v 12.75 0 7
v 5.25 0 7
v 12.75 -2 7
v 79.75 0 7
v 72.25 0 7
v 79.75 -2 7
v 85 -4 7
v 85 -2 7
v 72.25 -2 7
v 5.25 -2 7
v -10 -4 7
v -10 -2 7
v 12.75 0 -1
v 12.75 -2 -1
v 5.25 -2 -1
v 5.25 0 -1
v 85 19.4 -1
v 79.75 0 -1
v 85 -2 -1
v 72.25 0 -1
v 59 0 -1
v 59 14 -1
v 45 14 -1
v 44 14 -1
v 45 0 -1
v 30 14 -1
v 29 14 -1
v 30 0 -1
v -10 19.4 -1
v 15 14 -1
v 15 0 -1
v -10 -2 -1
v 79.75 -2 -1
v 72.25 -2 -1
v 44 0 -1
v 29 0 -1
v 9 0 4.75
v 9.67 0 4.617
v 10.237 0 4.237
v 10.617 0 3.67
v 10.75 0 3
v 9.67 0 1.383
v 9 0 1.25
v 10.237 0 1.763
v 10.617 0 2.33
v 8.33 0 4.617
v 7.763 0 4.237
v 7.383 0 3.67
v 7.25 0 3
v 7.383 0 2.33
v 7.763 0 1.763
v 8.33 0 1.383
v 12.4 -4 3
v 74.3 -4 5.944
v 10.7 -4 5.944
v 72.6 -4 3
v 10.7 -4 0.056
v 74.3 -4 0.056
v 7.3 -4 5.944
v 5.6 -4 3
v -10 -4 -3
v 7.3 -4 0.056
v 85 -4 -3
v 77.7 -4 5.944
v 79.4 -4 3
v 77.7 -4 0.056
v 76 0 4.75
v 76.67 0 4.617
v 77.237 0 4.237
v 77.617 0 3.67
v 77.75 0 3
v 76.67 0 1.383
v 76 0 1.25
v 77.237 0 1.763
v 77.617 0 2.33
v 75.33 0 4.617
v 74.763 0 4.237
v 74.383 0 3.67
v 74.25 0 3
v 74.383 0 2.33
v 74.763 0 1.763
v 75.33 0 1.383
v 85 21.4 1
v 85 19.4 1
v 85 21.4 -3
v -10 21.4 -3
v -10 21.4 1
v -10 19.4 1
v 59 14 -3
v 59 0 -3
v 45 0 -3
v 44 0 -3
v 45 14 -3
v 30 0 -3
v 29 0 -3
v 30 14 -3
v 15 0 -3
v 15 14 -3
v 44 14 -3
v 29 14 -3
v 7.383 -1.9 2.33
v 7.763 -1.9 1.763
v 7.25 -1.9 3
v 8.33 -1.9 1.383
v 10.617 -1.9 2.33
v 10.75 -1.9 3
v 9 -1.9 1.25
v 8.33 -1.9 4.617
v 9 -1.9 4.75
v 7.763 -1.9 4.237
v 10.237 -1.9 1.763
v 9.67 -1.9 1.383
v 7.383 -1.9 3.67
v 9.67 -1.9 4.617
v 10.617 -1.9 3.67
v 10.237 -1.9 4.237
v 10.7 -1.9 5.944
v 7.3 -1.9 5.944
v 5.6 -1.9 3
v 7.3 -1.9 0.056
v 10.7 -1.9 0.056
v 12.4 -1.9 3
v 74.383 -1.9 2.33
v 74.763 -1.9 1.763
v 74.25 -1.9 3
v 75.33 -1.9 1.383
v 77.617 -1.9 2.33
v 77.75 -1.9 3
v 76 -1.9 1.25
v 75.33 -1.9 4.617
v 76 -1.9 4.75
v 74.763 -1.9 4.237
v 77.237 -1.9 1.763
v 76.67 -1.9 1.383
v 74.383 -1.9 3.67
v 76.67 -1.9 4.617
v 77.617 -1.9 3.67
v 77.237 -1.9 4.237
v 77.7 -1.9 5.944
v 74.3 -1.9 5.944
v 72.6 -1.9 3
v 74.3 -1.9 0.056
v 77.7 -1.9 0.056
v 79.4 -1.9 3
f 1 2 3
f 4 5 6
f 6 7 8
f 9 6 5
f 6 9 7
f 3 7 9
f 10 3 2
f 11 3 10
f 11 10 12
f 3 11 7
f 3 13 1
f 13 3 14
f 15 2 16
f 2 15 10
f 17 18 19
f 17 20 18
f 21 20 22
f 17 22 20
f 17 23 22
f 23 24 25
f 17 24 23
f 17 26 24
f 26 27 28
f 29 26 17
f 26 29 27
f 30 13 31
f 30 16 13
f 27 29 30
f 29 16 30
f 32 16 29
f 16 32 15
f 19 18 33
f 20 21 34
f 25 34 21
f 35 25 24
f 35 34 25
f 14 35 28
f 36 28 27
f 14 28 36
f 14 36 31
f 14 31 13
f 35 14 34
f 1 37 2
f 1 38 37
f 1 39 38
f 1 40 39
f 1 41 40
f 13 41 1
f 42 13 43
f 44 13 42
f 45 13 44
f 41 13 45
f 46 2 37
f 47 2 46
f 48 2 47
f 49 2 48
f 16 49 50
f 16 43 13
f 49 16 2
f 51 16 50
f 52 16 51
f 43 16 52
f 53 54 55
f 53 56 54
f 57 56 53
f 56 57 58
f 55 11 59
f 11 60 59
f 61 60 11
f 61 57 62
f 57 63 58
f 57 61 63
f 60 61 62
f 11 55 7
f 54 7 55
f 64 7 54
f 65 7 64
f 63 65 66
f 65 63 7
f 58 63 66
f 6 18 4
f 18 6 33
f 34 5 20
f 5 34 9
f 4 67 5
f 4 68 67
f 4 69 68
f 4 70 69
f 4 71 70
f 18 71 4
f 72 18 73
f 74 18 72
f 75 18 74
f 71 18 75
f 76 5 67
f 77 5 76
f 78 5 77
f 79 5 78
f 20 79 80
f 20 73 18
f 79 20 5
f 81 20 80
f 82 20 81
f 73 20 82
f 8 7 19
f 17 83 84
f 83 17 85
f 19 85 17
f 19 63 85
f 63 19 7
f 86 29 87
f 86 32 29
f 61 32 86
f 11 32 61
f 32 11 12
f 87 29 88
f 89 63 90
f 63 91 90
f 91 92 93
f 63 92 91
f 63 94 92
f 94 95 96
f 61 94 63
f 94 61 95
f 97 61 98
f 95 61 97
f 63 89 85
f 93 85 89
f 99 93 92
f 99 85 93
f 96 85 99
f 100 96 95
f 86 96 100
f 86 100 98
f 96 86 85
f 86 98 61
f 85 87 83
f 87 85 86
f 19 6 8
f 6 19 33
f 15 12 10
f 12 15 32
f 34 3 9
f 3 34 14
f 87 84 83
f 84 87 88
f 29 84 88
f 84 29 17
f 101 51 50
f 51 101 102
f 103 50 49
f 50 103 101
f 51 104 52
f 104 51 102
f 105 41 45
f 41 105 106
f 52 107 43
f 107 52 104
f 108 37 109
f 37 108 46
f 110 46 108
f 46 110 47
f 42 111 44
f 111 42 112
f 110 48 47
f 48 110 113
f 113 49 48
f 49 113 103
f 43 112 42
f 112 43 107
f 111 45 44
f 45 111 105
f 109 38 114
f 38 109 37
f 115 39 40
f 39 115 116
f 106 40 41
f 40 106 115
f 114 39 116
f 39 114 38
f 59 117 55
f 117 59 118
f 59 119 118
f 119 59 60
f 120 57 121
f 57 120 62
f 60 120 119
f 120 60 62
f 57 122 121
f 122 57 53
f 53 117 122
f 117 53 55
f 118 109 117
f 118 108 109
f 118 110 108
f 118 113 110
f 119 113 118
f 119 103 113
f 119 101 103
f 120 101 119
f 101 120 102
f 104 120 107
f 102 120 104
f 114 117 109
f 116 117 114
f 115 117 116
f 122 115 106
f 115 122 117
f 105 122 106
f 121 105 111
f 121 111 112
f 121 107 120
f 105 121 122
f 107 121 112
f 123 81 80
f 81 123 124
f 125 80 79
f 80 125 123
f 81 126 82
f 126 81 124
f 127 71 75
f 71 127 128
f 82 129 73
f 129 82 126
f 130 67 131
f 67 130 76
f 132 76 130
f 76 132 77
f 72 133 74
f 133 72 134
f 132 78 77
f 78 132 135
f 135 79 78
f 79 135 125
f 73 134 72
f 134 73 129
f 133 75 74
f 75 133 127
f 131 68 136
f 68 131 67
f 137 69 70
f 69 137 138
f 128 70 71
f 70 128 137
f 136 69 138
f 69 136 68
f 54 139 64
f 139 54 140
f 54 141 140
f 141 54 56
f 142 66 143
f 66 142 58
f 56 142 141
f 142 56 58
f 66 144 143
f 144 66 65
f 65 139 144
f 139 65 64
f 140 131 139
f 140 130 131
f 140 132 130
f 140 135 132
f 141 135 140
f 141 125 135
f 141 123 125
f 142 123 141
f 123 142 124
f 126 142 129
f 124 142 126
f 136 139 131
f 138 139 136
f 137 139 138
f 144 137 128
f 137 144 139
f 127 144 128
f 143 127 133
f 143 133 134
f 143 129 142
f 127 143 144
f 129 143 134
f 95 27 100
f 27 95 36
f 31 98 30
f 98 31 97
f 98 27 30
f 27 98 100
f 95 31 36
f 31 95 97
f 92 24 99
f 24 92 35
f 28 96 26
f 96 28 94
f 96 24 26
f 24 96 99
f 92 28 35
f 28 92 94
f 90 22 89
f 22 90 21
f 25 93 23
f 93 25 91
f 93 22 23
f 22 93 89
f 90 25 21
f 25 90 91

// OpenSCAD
// file: ../library/din41612/connector_dim.scad
// connector
// Connector to be mounted on pcb of the modules

pcb_thick=1.6;

con_w=87.5;   // width of connector bodywithout flanges of mounting holes 
con_d=2.8;    // diameter of mounting holes
con_d_w=88.9; // distance between mounting holes
con_m_h=6;    // height of mounting cube
con_h=13;     // largest z dimension

pcb_d_h=10.2;  // ???

// connector dimensions
motherboard_con_head_w=85;  // width of the connector head
motherboard_con_head_d=8.5; // depth of the connector head
motherboard_con_w=95;       // largest width of the connector
motherboard_con_h=11.6;     // largest height of the connector
motherboard_con_t=11;       // largest depth of the connector
motherboard_con_d_w=90;     // distance between mounting holes
motherboard_con_d=2.8;      // diameter of mounting holes
motherboard_con_out=5.2;    // height produced by the connector when pulgged in 

// pcb module connector dimension
pcbmodule_con_out=13-(5.3+2.8-2.54);  // distance connector sticks out of pcb

// for codings
//code=2157;
//code_n=14;
//code_l=motherboard_con_head_w/code_n/2;
//
//label_width=24;
//label_thick=0.5;
//label_size=6;
//label_text_thick=1;
//label_height=label_size+2;
//pass=0.5;
// file: bracket.scad
// bracket
// A bracket of the elecbox module
// - type: 0 front bracket, 1 rear bracket
// - width 1..n in steps
// - var: 0 do not create intermediate mounting holes, 1 create intermediate mounting holes 

include <pcbmodule_dim.scad>
include <../motherboard/motherboard_dim.scad>
include <../library/linurs/linurs_screw_dim.scad>

use <../library/linurs/linurs_screw.scad>


module bracket(type=0, width=1, var=0){
  echo("bracket");  
  color("White")
  translate([type*motherboard_w,
             0,
             0])  // move mirrored bracket in position if desired
  mirror([type*1,0,0])       // mirror it if desired
  difference(){
    union(){
      for(x=[1:width]){  // create the mounting hole cubes 
        for(z=[pcb_y1,pcb_y2]){
          translate([pcb_x1,
                     (x-1)*step*var-bracket_hole_cube_h/2,
                     z])
          cube([bracket_x1-bracket_t,bracket_hole_cube_h,3*screw_d[bracket_screw]],center=true);
        }
      }

      translate([bracket_t/2+bracket_offset_x,
                 step/2*width-bracket_hole_cube_h,
                 bracket_h/2+bracket_offset_z])  
      cube([bracket_t,step*width,bracket_h],center=true);  // create the bracket front


      translate([bracket_x1/2+bracket_offset_x,
                 bracket_t/2-bracket_hole_cube_h,
                 bracket_h/2+bracket_offset_z]) 
      cube([bracket_x1,bracket_t,bracket_h],center=true);  // create the bracket mounting


      translate([bracket_x2/2+bracket_offset_x,
                 bracket_t/2-bracket_hole_cube_h+step*width-bracket_t,
                 bracket_h/2+bracket_offset_z]) 
      cube([bracket_x2,bracket_t,bracket_h],center=true);  // create the bracket mounting


    }
    for(x=[1:width]){ // create the mounting hole 
      for(z=[pcb_y1,pcb_y2]){
        translate([pcb_x1,
                   (x-1)*step*var-olp,
                   z])
        rotate([0,90,0])
        rotate([-90,0,0])
        screw_fix(w=2*bracket_hole_cube_h,d=bracket_screw,type=head_no, t=screw_t);
      }
    }
  }
}

// to show
//bracket(type=1, width=2, var=1);
//
bracket();
//
bracket(type=1);
// file: ../library/linurs/linurs_screw.scad
// Metric screws and nuts 
// urs@linurs.org 2019
// It is targeted for 3D printing applications. 
// To look realistic is not the goal (Example: Nuts do not have a hole)

include <linurs_screw_dim.scad>

// Changes
//2019-02-09 split in two files
//2017-05-19 bug fix hexbolt had wrong diameter
//2017-01-22 bug fix lentgh of hex scre is outer lenght as other screw types
//2017-01-06 added hex screw
//2015-10-12 added screw_cut
//2015-11-29 screw_fix parameter sunk added, and module hex_bolt

// Consistent parameters in this file
// d screw diameter M2_5, M3, ... (enumeration with screw_d)
// t millimeters added to diameters 
//   For the screw, head, nut = 0. 
//   For the piece where the screw, nut, ... passes through = 0.5 so it slides in well

// functions used multiple times to position nuts and heads
function headh_cyl(d)=screw_cyl[d][1];  // height of cyl screw head
function headh_cnt(d)=screw_cyl[d][1];  // height of cnt screw head
function headh(d,type=head_cyl)=(type==head_cyl ? headh_cyl(d) : (type==head_cnt ? headh_cnt(d) : 0 )); // height of screw head 

function nuth(d)=screw_hex[d][2];   // height of hex nut

// head of a cylinder screw
module screw_head_cyl(d=M3, t=0)
{
  screwhd=screw_cyl[d][0]+t; // diameter of cylinder screw head
  cylinder(d=screwhd,h=headh(d=d, type=head_cyl), center=true,$fn=16); // screw head
}

// head of a countersunk screw
module screw_head_cnt(d=M3, t=0)
{
  screwd=screw_d[d]+t; 
  screwhd=screw_cnt[d][0]+t; // diameter of cylinder screw head
  cylinder(d1=screwd,d2=screwhd,h=headh(d=d,type=head_cnt), center=true,$fn=16); // screw head
}

// head of a hex screw
module screw_head_hex(d=M3, t=0)
{
    translate([0,0,-nuth(d)/2])nut(d=d, t=t);
}

// head of all screws
module screw_head(d=M3, type=head_cyl, t=0)
{ 
  if(type==head_cnt){
    screw_head_cnt(d=d, t=t);
  } else {
    if(type==head_cyl){
      screw_head_cyl(d=d, t=t);
    } else {
       if(type==head_hex){
           screw_head_hex(d=d, t=t); 
       } 
    }    
  }
}

// hex bolt 
module hex_bolt(d=M3, h=10, t=0)
{
  nutd=screw_hex[d][1]+t; // outer diameter of hex bolt
  cylinder(r=nutd/2,h=h+t, center=true,$fn=6); // nut
}

// nut 
module nut(d=M3, t=0)
{
  hex_bolt(d=d, h=nuth(d), t=t);    
}

// screw 
// w outer width of the screw = screw length + head 
module screw(w=10, d=M3, type=head_cyl, t=0){
  screwd=screw_d[d]+t;       // screw diameter
  cylinder(d=screwd, h=w, center=true,$fn=16); // screw thread length
  translate([0,0,w/2-headh(d=d,type=type)/2])
  screw_head(d=d,type=type, t=t);
}

// screw fix
// w outer width of the screw = screw length + head 
// sink additional material below to remove 
// raise additional material above to remove
module screw_fix(w=10, d=M3, type=head_cyl, sink=0, raise=0, t=0){
  screw(w=w-sink*2, d=d, type=type, t=t);
  translate([0,0,-(w-sink*2)/2+nuth(d)/2])
    nut(d=d,t=t);
  //additional material to be removed above the nut  
  translate([0,0,-(w-sink+raise)/2])hex_bolt(d=d,h=sink+raise+0.01,t=t);    
  //additional material to be removed above the screw head
  if(type==head_cnt){  
    translate([0,0,(w-sink+raise)/2])
    cylinder(d=screw_cnt[d][0]+t,h=sink+raise+0.01,center=true,$fn=16);
  }else{ 
    translate([0,0,(w-sink+raise)/2])
    cylinder(d=screw_cyl[d][0]+t,h=sink+raise+0.01,center=true,$fn=16);
  }     
}
//screw_fix();
//translate([10,0,0])screw_fix(sink=2,type=head_cnt);
//

// screw cut
// material to be extracted from object to slide in a counter sunk screw for fixation
// w height of the cut out
// i depth of the screw
module screw_cut(d=M3,w=20,i=10,t=0,fn=32){
    hsh=screw_cnt[d][1];
    ws=screw_cnt[d][0]+t;
    ds=screw_d[d]+t;
    
    translate([i/2,0,-(w-hsh)/2])
      cube([i,ws,hsh],center=true);
    
    translate([0,0,-(w-hsh)/2])
      cylinder(d=ws,h=hsh,center=true,$fn=32);
    
    translate([0,0,-(w-hsh)/2+hsh])
        cylinder(d2=ds, d1=ws, h=hsh,center=true,$fn=fn);
    
    cylinder(h=w, d=ds, center=true, $fn=fn);   
    
    translate([i/2,0,0]) 
        cube([i,ds,w],center=true);
    
    for(y=[-1,1]){
        translate([i/2,y*ds/2,-w/2+hsh])
            rotate([45,0,0])
            cube([i,sqrt(2)*(ws-ds)/2,sqrt(2)*(ws-ds)/2],center=true);
    }
}
//screw_cut();

// nut cut
// material to be extracted from object to slide in a nut for fixation
// w height of the cylinder
// i lenght of the inlet
module nut_cut(w=10, wi=0, d=M3, i=10, t=0, raise=0, type=head_cyl){ 
  nut(d,t);
  translate([i/2,0,0])
    cube([i,screw_hex[d][0]+t,nuth(d)+t],center=true);
  translate([0,0,-wi])
      if(type==head_cnt){    
          screw(w=w, d=d, type=type, t=t); 
        translate([0,0,(w+raise)/2-0.01])
          cylinder(d=screw_cnt[d][0]+t,h=raise,center=true,$fn=16);
      }else{ 
          screw(w=w, d=d, type=type, t=t);   
        translate([0,0,(w+raise)/2-0.01])
          cylinder(d=screw_cyl[d][0]+t,h=raise,center=true,$fn=16);
      }       
}
//nut_cut(raise=2,type=head_cnt,i=14,w=20,wi=2, t=1);

// nut cut
// material to be extracted from object to slide in a nut for fixation
// w height of the cylinder
// i lenght of the inlet
module nut_cut_r(w=10, wi=0, d=M3, i=10, t=0, raise=0, type=head_cyl){ 
  rotate([0,0,90])nut(d,t);
  translate([i/2,0,0])
    cube([i,screw_hex[d][1]+t,nuth(d)+t],center=true);
  translate([0,0,-wi])
      if(type==head_cnt){    
          screw(w=w, d=d, type=type, t=t); 
        translate([0,0,(w+raise)/2-0.01])
          cylinder(d=screw_cnt[d][0]+t,h=raise,center=true,$fn=16);
      }else{ 
          screw(w=w, d=d, type=type, t=t);   
        translate([0,0,(w+raise)/2-0.01])
          cylinder(d=screw_cyl[d][0]+t,h=raise,center=true,$fn=16);
      }       
}
//nut_cut(raise=2,type=head_cnt,i=14,


// present the library
show=1;

if(show==1){
    grid=20;
    
    for (j=[0:10]){
        for (i=[0:3])
           translate([j*grid,i*grid,0]){  
           
    // elements           
           if(j==0){
             screw_fix(w=(i+2)*5,d=i, type=head_cyl, t=0);
           }
       
           if(j==1){
             nut(d=i,t=0);
           } 
       
           if(j==2){   
              screw(d=i,t=0);
           } 
           
           if(j==3){   
              screw(d=i,t=0,type=head_cnt);
           } 
           
           if(j==4){   
              screw(d=i,t=0,type=head_hex);
           } 
           
           if(j==5){   
              hex_bolt(d=i,t=0);
           } 
           
       }
    }   
     
    for (j=[0:2]){
        for (i=[0:3])
           translate([j*grid,-(i+1)*grid,0]){  
             difference(){
                cube([3*screw_d[i],3*screw_d[i],(i+2)*5-0.1],center=true);    
    
                if(j==0){
                  screw_fix(w=(i+2)*5,d=i,type=head_cnt, t=0.5);
                }   
                
                if(j==1){
                  nut_cut(d=i,w=(i+2)*5);
                }
                if(j==2){
                  screw_cut(d=1,w=(i+2)*5);
                }
            
             }
           }  
        
    }
}
   
// file: ../library/linurs/linurs_screw_dim.scad
// Metric screws and nuts 
// urs@linurs.org 2015

// contains dimensions of linurs_screw and can be included in other 
// OpenScad files 


// Consistent parameters in this file
// d screw diameter M2_5, M3, ... (enumeration with screw_d)
// t millimeters added to diameters 
//   For the screw, head, nut = 0. 
//   For the piece where the screw, nut, ... passes through = 0.5 so it slides in well

// enumerations of metric threads
M2_5=0;
M3=1;
M4=2;
M5=3;

// enumerations screw head type
head_cyl=0; // cylinder
head_cnt=1; // countrsunk
head_no=2;  // no head at all
head_hex=3;  // no head at all

// screw diameters
screw_d=[
2.5, // M2.5
3.0, // M3
4.0, // M4
5.0  // M5
];

// sizes for hex nuts
screw_hex=[
//   s,   e,   h
 [ 5.0, 5.8, 1.7], // M2.5
 [ 5.5, 6.4, 2.0], // M3
 [ 7.0, 8.1, 2.8], // M4
 [ 8.0, 9.2, 3.5]  // M5
];

// sizes for cylinder screw heads
screw_cyl=[
//   d,   h
 [ 4.5, 1.6], // M2.5
 [ 5.5, 2.0], // M3
 [ 7.0, 2.6], // M4
 [ 8.5, 3.3]  // M5
];

// sizes for countersunk screw heads
screw_cnt=[
//   d,   h
 [ 4.7, 1.50], // M2.5
 [ 5.6, 1.65], // M3
 [ 7.4, 2.20], // M4
 [ 9.2, 2.50]  // M5
];
// file: ../motherboard/motherboard_dim.scad
include<../library/din41612/connector_dim.scad>
// motherboard pcb dimensions
motherboard_w=100;   // pcb width
motherboard_t=1.6;   // pcb thickness
motherboard_pass=0.5;// gap to fit screws 
step=25.4;           // distance between modules



// offset
motherboard_z_offset= -(pcbmodule_con_out+motherboard_con_out+motherboard_t); // z offset motherboard built in
// file: pcbmodule_dim.scad
include <../library/linurs/linurs_screw_dim.scad>
include <../motherboard/motherboard_dim.scad>
// pcb constants
pcb_h=80;              // height of the pcb
pcb_thick=1.6;         // thickness
pcb_x1=3;              // position mounting holes
pcb_x2=97;
pcb_y1=9;
pcb_y2=76;
pcb_d=3;               // diameter of holes

// bracket constants
bracket_t=2;           // thickness of bracket
bracket_x1=10;         // depth of the U shape at the side of the screw
bracket_x2=4;          // depth of the U shape at the side where no screw is  
bracket_h=pcb_h+15;    // height of bracket
bracket_hole_cube_h=4; // height of the mounting hole cube
bracket_screw=M2_5;    // hole for the screw

// bracket offsets
bracket_offset_x=-3;   // bracket offset in elecbox x axis (adding gap)
bracket_offset_z=-10;  // bracket offset in elecbox z axis

// pcb module dimensions
pcbmodule_w=(-bracket_offset_x)*2+motherboard_w; // depth of the module
pcbmodule_h=bracket_h;                           // hight of the module   
pcbmodule_l=step;                                // width of the module   

screw_t=1; //mm added so screws fit into holes
olp=0.1; // overlapp distance to produce nice body after difference() 
// main file
// bracket
// A bracket of the elecbox module
// - type: 0 front bracket, 1 rear bracket
// - width 1..n in steps
// - var: 0 do not create intermediate mounting holes, 1 create intermediate mounting holes 

include <pcbmodule_dim.scad>
include <../motherboard/motherboard_dim.scad>
include <../library/linurs/linurs_screw_dim.scad>

use <../library/linurs/linurs_screw.scad>
use <bracket.scad>

module arduino(){
    difference(){
        bracket(type=0);
        translate([0,1+12/2,52.5+13/2])cube([20,12,13],center=true);
        translate([0,1+12/2,24+10/2])cube([20,12,10],center=true);
        translate([0,1+12+2/2,21.5+54/2])cube([20,2,54],center=true);
    }
}
//rotate([0,-90,0])
//arduino();

module 3DprinterIOfront(){
    difference(){
        bracket(type=0);
        translate([0,11/2,37.5+34/2])cube([20,11,34],center=true);        
    }
}
//rotate([0,-90,0])
//3DprinterIOfront();

module 3DprinterIOback(){
    difference(){
        translate([-100,0,0])bracket(type=1);
        translate([0,14/2,12+31/2])cube([20,14,31],center=true); 
        translate([0,14/2,53.5+18.5/2])cube([20,14,18.5],center=true);               
    }
}
//rotate([0,90,0])
//3DprinterIOback();

module Fetback(){
    difference(){
        translate([-100,0,0])bracket(type=1);
        translate([0,14/2,15+51/2])cube([20,14,51],center=true); 
       
    }
}
//rotate([0,90,0])
//Fetback();

module Stepperback(){
    difference(){
        translate([-100,0,0])bracket(type=1);
        translate([0,14/2,15+14/2])cube([20,14,14],center=true); 
        translate([0,14/2,30+14/2])cube([20,14,14],center=true); 
        translate([0,14/2,45+14/2])cube([20,14,14],center=true); 
     //   translate([0,14/2,60+14/2])cube([20,14,8],center=true); 
            
    }
}
//
rotate([0,90,0])
//
Stepperback();

module Stepperfront(){
    difference(){
        bracket(type=0);
        translate([0,14/2,15+14/2])cube([20,14,14],center=true); 
        translate([0,14/2,30+14/2])cube([20,14,14],center=true);    
       translate([0,14/2,60+14/2])cube([20,14,8],center=true);      
    }
}
//rotate([0,-90,0])
//Stepperfront();

module I2Cback(){
    difference(){
        translate([-100,0,0])bracket(type=1);
        translate([0,12/2,31+13/2])cube([20,12,13],center=true);       
    }
}
//rotate([0,90,0])
//I2Cback();

module I2Cfront(){
    difference(){
        bracket(type=0);
        translate([0,13/2,21+25/2])cube([20,13,25],center=true); 
        translate([0,5,49])rotate([0,90,0])cylinder(h=20,d=5.5,center=true, $fn=16);    
        translate([0,5,57])rotate([0,90,0])cylinder(h=20,d=5.5,center=true, $fn=16);      
    }
}
//rotate([0,-90,0])
//I2Cfront();

module MCP2221back(){
    h=12;
    w=13;
    z=31;
    difference(){
        translate([-100,0,0])bracket(type=1);
        translate([0,h/2+pcb_thick,z+w/2])cube([20,h,w],center=true);       
    }
}
//rotate([0,90,0])
//MCP2221back();

module MCP2221front(){
    h1=12;
    w1=12;
    z1=29;
    d2=4;
    h2=3;
    z2=66;
    difference(){
        bracket(type=0);
        translate([0,h1/2+pcb_thick,z1+w1/2])cube([20,h1,w1],center=true); 
        translate([0,h2+pcb_thick,z2])rotate([0,90,0])cylinder(h=20,d=d2,center=true, $fn=16);          
    }
}
//rotate([0,-90,0])
//MCP2221front();



module AvrCtrlback(){
    h1=12.5;
    w1=12;
    z1=14;
 
    h2=10;
    w2=39;
    z2=34.5;
    difference(){
        translate([-100,0,0])bracket(type=1);
        translate([0,h1/2+pcb_thick,z1+w1/2])cube([20,h1,w1],center=true);
        translate([0,h2/2+pcb_thick,z2+w2/2])cube([20,h2,w2],center=true);
        
        translate([-9,-2,0])cube([5,4,100]);
        
    }
}
//rotate([0,90,0])
//AvrCtrlback();

module AvrCtrlfront(){
    h1=14;
    w1=32;
    z1=12.5;
    
    h2=11.5;
    w2=13;
    z2=46.5;
    
    d3=4;
    h3=4.5;
    z3=67;
    
    d4=4.8;  //4.4 Loch 5 Ring
    h4=12;
    z4=63.5;
    
    d5=d4;
    h5=h4;
    z5=69.5;
    
    h6=9;
    
    difference(){
        bracket(type=0);
        translate([0,h1/2+pcb_thick,z1+w1/2])cube([20,h1,w1],center=true); 
        translate([0,h2/2+pcb_thick,z2+w2/2])cube([20,h2,w2],center=true);
    
    
    translate([-0.5,h6/2+pcb_thick,z3])cube([4,h6,h6],center=true);    
        translate([0,h3+pcb_thick,z3])rotate([0,90,0])cylinder(h=20,d=d3,center=true, $fn=16); 
    
    
        
        translate([0,h4+pcb_thick,z4])rotate([0,90,0])cylinder(h=20,d=d4,center=true, $fn=16);   
         translate([0,h5+pcb_thick,z5])rotate([0,90,0])cylinder(h=20,d=d5,center=true, $fn=16);   
        
    }
}
//rotate([0,-90,0])
//AvrCtrlfront();

module BatDocback(){
        translate([-100,0,0])bracket(type=1,width=2);
}
//rotate([0,90,0])
//BatDocback();

module BatDocfront(){
    d1=7;
    h1=10;
    z1=20;
    y1=2;
    
    d2=7;
    h3=10;
    z2=65;
    
    difference(){
        bracket(type=0, width=2);
        for(i=[-1,1]){
          translate([0,i*h1+20+pcb_thick,z1])rotate([0,90,0])cylinder(h=20,d=d1,center=true, $fn=16); 
          translate([0,i*h1+20+pcb_thick,z1])rotate([0,90,0])cube([d1+2*y1,y1,20],center=true); 
        }
 
        translate([0,h3+pcb_thick,z2])rotate([0,90,0])cylinder(h=20,d=d2,center=true, $fn=16);      
    }
}
//rotate([0,-90,0])
//BatDocfront();
